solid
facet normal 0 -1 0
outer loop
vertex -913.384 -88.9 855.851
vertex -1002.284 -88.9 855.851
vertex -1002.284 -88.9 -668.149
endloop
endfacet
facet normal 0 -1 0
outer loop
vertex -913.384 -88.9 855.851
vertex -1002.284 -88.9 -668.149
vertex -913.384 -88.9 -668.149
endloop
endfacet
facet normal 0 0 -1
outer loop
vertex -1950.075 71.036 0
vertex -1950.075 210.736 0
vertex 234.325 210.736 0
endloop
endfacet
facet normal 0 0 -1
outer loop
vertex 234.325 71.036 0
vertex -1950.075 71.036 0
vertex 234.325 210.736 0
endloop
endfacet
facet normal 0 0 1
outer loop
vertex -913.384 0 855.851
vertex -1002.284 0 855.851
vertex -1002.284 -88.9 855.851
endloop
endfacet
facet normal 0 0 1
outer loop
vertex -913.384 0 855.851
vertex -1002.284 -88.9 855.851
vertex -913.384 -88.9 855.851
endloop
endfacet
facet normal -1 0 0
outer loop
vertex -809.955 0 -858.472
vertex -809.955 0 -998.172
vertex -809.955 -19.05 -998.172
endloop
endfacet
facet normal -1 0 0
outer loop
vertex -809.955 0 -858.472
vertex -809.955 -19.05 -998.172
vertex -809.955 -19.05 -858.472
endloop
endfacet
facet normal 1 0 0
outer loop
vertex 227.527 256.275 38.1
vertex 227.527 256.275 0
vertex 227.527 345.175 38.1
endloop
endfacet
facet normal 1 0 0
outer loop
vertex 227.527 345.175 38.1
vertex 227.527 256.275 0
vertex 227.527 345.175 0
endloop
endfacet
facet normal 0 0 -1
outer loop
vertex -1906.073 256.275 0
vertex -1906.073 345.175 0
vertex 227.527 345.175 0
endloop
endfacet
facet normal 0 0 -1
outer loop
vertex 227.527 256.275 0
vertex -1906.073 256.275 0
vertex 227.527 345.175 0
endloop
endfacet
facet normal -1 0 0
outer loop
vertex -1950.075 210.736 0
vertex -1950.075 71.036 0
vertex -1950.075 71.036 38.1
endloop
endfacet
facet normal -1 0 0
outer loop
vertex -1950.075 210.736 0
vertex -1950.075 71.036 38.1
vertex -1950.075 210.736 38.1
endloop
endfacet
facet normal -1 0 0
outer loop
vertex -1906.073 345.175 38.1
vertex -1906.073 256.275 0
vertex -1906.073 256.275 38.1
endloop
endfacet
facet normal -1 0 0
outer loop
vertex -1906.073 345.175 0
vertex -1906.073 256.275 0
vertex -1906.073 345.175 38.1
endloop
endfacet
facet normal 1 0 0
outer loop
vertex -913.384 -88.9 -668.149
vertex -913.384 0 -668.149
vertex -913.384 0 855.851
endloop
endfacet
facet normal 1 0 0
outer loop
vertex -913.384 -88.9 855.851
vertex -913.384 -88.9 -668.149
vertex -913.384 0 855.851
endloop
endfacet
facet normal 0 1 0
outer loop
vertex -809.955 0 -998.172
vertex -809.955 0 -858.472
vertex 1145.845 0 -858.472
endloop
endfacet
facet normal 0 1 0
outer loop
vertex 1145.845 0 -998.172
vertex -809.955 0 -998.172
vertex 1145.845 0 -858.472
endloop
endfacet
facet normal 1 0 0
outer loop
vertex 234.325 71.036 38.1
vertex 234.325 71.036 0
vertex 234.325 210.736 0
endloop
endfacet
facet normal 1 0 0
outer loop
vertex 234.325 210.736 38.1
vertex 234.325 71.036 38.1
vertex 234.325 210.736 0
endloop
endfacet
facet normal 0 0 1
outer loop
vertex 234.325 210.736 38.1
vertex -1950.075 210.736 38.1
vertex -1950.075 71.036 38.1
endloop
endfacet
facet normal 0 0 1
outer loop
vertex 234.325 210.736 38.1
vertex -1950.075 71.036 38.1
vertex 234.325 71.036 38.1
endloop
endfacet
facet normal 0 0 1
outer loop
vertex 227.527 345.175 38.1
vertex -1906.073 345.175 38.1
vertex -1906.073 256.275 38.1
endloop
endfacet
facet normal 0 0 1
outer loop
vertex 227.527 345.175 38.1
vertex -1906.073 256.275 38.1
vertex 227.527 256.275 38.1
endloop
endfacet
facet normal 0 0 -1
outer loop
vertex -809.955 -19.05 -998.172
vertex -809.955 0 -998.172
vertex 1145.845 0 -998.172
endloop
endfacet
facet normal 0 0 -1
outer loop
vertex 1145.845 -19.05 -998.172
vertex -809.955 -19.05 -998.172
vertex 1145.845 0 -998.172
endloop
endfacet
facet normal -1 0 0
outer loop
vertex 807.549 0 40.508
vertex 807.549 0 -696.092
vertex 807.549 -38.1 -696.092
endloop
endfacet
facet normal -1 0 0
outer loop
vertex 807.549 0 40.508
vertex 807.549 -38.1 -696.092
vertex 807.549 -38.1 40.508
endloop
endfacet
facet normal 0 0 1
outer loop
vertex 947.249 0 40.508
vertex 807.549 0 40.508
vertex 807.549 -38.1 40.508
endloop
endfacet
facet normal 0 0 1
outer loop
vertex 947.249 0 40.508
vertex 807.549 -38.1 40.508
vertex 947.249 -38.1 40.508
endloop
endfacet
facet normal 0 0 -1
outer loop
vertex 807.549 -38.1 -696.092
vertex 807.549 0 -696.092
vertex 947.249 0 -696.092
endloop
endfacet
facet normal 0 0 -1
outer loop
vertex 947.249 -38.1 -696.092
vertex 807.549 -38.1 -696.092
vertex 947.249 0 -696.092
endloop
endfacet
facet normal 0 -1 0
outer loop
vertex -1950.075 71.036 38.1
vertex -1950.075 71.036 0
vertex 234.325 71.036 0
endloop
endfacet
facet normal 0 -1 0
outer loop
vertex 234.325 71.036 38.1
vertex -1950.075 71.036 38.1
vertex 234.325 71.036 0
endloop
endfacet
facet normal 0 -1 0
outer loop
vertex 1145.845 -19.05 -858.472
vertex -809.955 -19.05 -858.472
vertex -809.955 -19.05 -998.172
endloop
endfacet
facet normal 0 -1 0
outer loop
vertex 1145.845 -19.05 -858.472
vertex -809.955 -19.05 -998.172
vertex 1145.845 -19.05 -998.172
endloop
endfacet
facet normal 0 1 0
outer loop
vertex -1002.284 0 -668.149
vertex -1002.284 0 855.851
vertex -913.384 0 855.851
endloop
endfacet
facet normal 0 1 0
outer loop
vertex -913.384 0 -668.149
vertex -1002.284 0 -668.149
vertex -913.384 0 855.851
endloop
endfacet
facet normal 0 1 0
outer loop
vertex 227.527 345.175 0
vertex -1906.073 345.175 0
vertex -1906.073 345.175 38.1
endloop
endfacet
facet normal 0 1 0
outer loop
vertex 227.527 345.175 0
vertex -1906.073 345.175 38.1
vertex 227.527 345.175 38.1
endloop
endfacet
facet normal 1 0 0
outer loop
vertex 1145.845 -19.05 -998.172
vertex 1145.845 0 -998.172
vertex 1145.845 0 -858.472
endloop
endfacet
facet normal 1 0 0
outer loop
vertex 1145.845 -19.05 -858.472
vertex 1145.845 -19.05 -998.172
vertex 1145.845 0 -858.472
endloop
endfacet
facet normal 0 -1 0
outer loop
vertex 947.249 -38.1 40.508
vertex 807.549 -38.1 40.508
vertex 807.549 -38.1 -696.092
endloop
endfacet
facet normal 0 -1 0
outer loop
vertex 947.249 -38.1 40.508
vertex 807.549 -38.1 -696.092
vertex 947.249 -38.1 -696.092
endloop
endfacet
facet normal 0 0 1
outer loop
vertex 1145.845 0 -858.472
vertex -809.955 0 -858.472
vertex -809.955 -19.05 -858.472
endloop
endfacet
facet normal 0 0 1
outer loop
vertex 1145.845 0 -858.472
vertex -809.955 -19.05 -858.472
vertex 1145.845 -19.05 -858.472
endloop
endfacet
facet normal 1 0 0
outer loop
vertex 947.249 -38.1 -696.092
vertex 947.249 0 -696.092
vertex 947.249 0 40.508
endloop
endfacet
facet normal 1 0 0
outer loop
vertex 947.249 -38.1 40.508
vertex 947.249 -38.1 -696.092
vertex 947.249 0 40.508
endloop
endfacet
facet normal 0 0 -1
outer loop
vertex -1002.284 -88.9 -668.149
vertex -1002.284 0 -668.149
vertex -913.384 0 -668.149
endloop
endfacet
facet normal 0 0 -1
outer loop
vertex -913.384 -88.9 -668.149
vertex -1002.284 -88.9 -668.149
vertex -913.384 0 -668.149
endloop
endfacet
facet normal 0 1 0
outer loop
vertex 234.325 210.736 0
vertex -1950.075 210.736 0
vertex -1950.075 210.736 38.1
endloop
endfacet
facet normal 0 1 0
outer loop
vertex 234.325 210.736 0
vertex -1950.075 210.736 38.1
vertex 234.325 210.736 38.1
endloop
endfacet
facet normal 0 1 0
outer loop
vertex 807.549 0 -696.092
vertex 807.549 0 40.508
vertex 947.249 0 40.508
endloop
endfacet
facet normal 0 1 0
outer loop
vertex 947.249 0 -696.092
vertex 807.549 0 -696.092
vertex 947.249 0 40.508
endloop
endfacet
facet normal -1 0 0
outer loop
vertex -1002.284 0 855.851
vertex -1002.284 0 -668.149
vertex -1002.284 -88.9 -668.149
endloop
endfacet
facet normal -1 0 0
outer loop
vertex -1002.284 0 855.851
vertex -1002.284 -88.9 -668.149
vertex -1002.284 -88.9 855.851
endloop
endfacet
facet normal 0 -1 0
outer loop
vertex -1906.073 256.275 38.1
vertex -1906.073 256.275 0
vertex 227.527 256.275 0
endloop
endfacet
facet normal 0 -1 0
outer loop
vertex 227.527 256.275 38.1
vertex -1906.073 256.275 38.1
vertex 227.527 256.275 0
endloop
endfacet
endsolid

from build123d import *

# Parameters (mm, degrees)
F0_W     = 88.9
F0_H     = 1524
F1_DEPTH = 88.9
F2_W     = 2133.6
F2_H     = 88.9
F3_DEPTH = 38.1
F4_W     = 2184.4
F4_H     = 139.7
F5_DEPTH = 38.1
F6_W     = 1955.8
F6_H     = 139.7
F7_DEPTH = 19.05
F8_W     = 139.7
F8_H     = 736.6
F9_DEPTH = 38.1


with BuildPart() as f1:
    # F0 (on Front) → F1 (new body)
    with BuildSketch(Plane.XZ):
        with Locations((-957.834118, 93.850595)):
            Rectangle(F0_W, F0_H)
    extrude(amount=F1_DEPTH)


with BuildPart() as f3:
    # F2 (on Top) → F3 (new body)
    with BuildSketch(Plane.XY):
        with Locations((-839.272805, 300.724819)):
            Rectangle(F2_W, F2_H)
    extrude(amount=F3_DEPTH)


with BuildPart() as f5:
    # F4 (on Top) → F5 (new body)
    with BuildSketch(Plane.XY):
        with Locations((-857.875059, 140.886257)):
            Rectangle(F4_W, F4_H)
    extrude(amount=F5_DEPTH)


with BuildPart() as f7:
    # F6 (on Front) → F7 (new body)
    with BuildSketch(Plane.XZ):
        with Locations((167.944855, -928.322224)):
            Rectangle(F6_W, F6_H)
    extrude(amount=F7_DEPTH)


with BuildPart() as f9:
    # F8 (on Front) → F9 (new body)
    with BuildSketch(Plane.XZ):
        with Locations((877.399293, -327.792069)):
            Rectangle(F8_W, F8_H)
    extrude(amount=F9_DEPTH)


solid = Compound([f1.part, f3.part, f5.part, f7.part, f9.part])
